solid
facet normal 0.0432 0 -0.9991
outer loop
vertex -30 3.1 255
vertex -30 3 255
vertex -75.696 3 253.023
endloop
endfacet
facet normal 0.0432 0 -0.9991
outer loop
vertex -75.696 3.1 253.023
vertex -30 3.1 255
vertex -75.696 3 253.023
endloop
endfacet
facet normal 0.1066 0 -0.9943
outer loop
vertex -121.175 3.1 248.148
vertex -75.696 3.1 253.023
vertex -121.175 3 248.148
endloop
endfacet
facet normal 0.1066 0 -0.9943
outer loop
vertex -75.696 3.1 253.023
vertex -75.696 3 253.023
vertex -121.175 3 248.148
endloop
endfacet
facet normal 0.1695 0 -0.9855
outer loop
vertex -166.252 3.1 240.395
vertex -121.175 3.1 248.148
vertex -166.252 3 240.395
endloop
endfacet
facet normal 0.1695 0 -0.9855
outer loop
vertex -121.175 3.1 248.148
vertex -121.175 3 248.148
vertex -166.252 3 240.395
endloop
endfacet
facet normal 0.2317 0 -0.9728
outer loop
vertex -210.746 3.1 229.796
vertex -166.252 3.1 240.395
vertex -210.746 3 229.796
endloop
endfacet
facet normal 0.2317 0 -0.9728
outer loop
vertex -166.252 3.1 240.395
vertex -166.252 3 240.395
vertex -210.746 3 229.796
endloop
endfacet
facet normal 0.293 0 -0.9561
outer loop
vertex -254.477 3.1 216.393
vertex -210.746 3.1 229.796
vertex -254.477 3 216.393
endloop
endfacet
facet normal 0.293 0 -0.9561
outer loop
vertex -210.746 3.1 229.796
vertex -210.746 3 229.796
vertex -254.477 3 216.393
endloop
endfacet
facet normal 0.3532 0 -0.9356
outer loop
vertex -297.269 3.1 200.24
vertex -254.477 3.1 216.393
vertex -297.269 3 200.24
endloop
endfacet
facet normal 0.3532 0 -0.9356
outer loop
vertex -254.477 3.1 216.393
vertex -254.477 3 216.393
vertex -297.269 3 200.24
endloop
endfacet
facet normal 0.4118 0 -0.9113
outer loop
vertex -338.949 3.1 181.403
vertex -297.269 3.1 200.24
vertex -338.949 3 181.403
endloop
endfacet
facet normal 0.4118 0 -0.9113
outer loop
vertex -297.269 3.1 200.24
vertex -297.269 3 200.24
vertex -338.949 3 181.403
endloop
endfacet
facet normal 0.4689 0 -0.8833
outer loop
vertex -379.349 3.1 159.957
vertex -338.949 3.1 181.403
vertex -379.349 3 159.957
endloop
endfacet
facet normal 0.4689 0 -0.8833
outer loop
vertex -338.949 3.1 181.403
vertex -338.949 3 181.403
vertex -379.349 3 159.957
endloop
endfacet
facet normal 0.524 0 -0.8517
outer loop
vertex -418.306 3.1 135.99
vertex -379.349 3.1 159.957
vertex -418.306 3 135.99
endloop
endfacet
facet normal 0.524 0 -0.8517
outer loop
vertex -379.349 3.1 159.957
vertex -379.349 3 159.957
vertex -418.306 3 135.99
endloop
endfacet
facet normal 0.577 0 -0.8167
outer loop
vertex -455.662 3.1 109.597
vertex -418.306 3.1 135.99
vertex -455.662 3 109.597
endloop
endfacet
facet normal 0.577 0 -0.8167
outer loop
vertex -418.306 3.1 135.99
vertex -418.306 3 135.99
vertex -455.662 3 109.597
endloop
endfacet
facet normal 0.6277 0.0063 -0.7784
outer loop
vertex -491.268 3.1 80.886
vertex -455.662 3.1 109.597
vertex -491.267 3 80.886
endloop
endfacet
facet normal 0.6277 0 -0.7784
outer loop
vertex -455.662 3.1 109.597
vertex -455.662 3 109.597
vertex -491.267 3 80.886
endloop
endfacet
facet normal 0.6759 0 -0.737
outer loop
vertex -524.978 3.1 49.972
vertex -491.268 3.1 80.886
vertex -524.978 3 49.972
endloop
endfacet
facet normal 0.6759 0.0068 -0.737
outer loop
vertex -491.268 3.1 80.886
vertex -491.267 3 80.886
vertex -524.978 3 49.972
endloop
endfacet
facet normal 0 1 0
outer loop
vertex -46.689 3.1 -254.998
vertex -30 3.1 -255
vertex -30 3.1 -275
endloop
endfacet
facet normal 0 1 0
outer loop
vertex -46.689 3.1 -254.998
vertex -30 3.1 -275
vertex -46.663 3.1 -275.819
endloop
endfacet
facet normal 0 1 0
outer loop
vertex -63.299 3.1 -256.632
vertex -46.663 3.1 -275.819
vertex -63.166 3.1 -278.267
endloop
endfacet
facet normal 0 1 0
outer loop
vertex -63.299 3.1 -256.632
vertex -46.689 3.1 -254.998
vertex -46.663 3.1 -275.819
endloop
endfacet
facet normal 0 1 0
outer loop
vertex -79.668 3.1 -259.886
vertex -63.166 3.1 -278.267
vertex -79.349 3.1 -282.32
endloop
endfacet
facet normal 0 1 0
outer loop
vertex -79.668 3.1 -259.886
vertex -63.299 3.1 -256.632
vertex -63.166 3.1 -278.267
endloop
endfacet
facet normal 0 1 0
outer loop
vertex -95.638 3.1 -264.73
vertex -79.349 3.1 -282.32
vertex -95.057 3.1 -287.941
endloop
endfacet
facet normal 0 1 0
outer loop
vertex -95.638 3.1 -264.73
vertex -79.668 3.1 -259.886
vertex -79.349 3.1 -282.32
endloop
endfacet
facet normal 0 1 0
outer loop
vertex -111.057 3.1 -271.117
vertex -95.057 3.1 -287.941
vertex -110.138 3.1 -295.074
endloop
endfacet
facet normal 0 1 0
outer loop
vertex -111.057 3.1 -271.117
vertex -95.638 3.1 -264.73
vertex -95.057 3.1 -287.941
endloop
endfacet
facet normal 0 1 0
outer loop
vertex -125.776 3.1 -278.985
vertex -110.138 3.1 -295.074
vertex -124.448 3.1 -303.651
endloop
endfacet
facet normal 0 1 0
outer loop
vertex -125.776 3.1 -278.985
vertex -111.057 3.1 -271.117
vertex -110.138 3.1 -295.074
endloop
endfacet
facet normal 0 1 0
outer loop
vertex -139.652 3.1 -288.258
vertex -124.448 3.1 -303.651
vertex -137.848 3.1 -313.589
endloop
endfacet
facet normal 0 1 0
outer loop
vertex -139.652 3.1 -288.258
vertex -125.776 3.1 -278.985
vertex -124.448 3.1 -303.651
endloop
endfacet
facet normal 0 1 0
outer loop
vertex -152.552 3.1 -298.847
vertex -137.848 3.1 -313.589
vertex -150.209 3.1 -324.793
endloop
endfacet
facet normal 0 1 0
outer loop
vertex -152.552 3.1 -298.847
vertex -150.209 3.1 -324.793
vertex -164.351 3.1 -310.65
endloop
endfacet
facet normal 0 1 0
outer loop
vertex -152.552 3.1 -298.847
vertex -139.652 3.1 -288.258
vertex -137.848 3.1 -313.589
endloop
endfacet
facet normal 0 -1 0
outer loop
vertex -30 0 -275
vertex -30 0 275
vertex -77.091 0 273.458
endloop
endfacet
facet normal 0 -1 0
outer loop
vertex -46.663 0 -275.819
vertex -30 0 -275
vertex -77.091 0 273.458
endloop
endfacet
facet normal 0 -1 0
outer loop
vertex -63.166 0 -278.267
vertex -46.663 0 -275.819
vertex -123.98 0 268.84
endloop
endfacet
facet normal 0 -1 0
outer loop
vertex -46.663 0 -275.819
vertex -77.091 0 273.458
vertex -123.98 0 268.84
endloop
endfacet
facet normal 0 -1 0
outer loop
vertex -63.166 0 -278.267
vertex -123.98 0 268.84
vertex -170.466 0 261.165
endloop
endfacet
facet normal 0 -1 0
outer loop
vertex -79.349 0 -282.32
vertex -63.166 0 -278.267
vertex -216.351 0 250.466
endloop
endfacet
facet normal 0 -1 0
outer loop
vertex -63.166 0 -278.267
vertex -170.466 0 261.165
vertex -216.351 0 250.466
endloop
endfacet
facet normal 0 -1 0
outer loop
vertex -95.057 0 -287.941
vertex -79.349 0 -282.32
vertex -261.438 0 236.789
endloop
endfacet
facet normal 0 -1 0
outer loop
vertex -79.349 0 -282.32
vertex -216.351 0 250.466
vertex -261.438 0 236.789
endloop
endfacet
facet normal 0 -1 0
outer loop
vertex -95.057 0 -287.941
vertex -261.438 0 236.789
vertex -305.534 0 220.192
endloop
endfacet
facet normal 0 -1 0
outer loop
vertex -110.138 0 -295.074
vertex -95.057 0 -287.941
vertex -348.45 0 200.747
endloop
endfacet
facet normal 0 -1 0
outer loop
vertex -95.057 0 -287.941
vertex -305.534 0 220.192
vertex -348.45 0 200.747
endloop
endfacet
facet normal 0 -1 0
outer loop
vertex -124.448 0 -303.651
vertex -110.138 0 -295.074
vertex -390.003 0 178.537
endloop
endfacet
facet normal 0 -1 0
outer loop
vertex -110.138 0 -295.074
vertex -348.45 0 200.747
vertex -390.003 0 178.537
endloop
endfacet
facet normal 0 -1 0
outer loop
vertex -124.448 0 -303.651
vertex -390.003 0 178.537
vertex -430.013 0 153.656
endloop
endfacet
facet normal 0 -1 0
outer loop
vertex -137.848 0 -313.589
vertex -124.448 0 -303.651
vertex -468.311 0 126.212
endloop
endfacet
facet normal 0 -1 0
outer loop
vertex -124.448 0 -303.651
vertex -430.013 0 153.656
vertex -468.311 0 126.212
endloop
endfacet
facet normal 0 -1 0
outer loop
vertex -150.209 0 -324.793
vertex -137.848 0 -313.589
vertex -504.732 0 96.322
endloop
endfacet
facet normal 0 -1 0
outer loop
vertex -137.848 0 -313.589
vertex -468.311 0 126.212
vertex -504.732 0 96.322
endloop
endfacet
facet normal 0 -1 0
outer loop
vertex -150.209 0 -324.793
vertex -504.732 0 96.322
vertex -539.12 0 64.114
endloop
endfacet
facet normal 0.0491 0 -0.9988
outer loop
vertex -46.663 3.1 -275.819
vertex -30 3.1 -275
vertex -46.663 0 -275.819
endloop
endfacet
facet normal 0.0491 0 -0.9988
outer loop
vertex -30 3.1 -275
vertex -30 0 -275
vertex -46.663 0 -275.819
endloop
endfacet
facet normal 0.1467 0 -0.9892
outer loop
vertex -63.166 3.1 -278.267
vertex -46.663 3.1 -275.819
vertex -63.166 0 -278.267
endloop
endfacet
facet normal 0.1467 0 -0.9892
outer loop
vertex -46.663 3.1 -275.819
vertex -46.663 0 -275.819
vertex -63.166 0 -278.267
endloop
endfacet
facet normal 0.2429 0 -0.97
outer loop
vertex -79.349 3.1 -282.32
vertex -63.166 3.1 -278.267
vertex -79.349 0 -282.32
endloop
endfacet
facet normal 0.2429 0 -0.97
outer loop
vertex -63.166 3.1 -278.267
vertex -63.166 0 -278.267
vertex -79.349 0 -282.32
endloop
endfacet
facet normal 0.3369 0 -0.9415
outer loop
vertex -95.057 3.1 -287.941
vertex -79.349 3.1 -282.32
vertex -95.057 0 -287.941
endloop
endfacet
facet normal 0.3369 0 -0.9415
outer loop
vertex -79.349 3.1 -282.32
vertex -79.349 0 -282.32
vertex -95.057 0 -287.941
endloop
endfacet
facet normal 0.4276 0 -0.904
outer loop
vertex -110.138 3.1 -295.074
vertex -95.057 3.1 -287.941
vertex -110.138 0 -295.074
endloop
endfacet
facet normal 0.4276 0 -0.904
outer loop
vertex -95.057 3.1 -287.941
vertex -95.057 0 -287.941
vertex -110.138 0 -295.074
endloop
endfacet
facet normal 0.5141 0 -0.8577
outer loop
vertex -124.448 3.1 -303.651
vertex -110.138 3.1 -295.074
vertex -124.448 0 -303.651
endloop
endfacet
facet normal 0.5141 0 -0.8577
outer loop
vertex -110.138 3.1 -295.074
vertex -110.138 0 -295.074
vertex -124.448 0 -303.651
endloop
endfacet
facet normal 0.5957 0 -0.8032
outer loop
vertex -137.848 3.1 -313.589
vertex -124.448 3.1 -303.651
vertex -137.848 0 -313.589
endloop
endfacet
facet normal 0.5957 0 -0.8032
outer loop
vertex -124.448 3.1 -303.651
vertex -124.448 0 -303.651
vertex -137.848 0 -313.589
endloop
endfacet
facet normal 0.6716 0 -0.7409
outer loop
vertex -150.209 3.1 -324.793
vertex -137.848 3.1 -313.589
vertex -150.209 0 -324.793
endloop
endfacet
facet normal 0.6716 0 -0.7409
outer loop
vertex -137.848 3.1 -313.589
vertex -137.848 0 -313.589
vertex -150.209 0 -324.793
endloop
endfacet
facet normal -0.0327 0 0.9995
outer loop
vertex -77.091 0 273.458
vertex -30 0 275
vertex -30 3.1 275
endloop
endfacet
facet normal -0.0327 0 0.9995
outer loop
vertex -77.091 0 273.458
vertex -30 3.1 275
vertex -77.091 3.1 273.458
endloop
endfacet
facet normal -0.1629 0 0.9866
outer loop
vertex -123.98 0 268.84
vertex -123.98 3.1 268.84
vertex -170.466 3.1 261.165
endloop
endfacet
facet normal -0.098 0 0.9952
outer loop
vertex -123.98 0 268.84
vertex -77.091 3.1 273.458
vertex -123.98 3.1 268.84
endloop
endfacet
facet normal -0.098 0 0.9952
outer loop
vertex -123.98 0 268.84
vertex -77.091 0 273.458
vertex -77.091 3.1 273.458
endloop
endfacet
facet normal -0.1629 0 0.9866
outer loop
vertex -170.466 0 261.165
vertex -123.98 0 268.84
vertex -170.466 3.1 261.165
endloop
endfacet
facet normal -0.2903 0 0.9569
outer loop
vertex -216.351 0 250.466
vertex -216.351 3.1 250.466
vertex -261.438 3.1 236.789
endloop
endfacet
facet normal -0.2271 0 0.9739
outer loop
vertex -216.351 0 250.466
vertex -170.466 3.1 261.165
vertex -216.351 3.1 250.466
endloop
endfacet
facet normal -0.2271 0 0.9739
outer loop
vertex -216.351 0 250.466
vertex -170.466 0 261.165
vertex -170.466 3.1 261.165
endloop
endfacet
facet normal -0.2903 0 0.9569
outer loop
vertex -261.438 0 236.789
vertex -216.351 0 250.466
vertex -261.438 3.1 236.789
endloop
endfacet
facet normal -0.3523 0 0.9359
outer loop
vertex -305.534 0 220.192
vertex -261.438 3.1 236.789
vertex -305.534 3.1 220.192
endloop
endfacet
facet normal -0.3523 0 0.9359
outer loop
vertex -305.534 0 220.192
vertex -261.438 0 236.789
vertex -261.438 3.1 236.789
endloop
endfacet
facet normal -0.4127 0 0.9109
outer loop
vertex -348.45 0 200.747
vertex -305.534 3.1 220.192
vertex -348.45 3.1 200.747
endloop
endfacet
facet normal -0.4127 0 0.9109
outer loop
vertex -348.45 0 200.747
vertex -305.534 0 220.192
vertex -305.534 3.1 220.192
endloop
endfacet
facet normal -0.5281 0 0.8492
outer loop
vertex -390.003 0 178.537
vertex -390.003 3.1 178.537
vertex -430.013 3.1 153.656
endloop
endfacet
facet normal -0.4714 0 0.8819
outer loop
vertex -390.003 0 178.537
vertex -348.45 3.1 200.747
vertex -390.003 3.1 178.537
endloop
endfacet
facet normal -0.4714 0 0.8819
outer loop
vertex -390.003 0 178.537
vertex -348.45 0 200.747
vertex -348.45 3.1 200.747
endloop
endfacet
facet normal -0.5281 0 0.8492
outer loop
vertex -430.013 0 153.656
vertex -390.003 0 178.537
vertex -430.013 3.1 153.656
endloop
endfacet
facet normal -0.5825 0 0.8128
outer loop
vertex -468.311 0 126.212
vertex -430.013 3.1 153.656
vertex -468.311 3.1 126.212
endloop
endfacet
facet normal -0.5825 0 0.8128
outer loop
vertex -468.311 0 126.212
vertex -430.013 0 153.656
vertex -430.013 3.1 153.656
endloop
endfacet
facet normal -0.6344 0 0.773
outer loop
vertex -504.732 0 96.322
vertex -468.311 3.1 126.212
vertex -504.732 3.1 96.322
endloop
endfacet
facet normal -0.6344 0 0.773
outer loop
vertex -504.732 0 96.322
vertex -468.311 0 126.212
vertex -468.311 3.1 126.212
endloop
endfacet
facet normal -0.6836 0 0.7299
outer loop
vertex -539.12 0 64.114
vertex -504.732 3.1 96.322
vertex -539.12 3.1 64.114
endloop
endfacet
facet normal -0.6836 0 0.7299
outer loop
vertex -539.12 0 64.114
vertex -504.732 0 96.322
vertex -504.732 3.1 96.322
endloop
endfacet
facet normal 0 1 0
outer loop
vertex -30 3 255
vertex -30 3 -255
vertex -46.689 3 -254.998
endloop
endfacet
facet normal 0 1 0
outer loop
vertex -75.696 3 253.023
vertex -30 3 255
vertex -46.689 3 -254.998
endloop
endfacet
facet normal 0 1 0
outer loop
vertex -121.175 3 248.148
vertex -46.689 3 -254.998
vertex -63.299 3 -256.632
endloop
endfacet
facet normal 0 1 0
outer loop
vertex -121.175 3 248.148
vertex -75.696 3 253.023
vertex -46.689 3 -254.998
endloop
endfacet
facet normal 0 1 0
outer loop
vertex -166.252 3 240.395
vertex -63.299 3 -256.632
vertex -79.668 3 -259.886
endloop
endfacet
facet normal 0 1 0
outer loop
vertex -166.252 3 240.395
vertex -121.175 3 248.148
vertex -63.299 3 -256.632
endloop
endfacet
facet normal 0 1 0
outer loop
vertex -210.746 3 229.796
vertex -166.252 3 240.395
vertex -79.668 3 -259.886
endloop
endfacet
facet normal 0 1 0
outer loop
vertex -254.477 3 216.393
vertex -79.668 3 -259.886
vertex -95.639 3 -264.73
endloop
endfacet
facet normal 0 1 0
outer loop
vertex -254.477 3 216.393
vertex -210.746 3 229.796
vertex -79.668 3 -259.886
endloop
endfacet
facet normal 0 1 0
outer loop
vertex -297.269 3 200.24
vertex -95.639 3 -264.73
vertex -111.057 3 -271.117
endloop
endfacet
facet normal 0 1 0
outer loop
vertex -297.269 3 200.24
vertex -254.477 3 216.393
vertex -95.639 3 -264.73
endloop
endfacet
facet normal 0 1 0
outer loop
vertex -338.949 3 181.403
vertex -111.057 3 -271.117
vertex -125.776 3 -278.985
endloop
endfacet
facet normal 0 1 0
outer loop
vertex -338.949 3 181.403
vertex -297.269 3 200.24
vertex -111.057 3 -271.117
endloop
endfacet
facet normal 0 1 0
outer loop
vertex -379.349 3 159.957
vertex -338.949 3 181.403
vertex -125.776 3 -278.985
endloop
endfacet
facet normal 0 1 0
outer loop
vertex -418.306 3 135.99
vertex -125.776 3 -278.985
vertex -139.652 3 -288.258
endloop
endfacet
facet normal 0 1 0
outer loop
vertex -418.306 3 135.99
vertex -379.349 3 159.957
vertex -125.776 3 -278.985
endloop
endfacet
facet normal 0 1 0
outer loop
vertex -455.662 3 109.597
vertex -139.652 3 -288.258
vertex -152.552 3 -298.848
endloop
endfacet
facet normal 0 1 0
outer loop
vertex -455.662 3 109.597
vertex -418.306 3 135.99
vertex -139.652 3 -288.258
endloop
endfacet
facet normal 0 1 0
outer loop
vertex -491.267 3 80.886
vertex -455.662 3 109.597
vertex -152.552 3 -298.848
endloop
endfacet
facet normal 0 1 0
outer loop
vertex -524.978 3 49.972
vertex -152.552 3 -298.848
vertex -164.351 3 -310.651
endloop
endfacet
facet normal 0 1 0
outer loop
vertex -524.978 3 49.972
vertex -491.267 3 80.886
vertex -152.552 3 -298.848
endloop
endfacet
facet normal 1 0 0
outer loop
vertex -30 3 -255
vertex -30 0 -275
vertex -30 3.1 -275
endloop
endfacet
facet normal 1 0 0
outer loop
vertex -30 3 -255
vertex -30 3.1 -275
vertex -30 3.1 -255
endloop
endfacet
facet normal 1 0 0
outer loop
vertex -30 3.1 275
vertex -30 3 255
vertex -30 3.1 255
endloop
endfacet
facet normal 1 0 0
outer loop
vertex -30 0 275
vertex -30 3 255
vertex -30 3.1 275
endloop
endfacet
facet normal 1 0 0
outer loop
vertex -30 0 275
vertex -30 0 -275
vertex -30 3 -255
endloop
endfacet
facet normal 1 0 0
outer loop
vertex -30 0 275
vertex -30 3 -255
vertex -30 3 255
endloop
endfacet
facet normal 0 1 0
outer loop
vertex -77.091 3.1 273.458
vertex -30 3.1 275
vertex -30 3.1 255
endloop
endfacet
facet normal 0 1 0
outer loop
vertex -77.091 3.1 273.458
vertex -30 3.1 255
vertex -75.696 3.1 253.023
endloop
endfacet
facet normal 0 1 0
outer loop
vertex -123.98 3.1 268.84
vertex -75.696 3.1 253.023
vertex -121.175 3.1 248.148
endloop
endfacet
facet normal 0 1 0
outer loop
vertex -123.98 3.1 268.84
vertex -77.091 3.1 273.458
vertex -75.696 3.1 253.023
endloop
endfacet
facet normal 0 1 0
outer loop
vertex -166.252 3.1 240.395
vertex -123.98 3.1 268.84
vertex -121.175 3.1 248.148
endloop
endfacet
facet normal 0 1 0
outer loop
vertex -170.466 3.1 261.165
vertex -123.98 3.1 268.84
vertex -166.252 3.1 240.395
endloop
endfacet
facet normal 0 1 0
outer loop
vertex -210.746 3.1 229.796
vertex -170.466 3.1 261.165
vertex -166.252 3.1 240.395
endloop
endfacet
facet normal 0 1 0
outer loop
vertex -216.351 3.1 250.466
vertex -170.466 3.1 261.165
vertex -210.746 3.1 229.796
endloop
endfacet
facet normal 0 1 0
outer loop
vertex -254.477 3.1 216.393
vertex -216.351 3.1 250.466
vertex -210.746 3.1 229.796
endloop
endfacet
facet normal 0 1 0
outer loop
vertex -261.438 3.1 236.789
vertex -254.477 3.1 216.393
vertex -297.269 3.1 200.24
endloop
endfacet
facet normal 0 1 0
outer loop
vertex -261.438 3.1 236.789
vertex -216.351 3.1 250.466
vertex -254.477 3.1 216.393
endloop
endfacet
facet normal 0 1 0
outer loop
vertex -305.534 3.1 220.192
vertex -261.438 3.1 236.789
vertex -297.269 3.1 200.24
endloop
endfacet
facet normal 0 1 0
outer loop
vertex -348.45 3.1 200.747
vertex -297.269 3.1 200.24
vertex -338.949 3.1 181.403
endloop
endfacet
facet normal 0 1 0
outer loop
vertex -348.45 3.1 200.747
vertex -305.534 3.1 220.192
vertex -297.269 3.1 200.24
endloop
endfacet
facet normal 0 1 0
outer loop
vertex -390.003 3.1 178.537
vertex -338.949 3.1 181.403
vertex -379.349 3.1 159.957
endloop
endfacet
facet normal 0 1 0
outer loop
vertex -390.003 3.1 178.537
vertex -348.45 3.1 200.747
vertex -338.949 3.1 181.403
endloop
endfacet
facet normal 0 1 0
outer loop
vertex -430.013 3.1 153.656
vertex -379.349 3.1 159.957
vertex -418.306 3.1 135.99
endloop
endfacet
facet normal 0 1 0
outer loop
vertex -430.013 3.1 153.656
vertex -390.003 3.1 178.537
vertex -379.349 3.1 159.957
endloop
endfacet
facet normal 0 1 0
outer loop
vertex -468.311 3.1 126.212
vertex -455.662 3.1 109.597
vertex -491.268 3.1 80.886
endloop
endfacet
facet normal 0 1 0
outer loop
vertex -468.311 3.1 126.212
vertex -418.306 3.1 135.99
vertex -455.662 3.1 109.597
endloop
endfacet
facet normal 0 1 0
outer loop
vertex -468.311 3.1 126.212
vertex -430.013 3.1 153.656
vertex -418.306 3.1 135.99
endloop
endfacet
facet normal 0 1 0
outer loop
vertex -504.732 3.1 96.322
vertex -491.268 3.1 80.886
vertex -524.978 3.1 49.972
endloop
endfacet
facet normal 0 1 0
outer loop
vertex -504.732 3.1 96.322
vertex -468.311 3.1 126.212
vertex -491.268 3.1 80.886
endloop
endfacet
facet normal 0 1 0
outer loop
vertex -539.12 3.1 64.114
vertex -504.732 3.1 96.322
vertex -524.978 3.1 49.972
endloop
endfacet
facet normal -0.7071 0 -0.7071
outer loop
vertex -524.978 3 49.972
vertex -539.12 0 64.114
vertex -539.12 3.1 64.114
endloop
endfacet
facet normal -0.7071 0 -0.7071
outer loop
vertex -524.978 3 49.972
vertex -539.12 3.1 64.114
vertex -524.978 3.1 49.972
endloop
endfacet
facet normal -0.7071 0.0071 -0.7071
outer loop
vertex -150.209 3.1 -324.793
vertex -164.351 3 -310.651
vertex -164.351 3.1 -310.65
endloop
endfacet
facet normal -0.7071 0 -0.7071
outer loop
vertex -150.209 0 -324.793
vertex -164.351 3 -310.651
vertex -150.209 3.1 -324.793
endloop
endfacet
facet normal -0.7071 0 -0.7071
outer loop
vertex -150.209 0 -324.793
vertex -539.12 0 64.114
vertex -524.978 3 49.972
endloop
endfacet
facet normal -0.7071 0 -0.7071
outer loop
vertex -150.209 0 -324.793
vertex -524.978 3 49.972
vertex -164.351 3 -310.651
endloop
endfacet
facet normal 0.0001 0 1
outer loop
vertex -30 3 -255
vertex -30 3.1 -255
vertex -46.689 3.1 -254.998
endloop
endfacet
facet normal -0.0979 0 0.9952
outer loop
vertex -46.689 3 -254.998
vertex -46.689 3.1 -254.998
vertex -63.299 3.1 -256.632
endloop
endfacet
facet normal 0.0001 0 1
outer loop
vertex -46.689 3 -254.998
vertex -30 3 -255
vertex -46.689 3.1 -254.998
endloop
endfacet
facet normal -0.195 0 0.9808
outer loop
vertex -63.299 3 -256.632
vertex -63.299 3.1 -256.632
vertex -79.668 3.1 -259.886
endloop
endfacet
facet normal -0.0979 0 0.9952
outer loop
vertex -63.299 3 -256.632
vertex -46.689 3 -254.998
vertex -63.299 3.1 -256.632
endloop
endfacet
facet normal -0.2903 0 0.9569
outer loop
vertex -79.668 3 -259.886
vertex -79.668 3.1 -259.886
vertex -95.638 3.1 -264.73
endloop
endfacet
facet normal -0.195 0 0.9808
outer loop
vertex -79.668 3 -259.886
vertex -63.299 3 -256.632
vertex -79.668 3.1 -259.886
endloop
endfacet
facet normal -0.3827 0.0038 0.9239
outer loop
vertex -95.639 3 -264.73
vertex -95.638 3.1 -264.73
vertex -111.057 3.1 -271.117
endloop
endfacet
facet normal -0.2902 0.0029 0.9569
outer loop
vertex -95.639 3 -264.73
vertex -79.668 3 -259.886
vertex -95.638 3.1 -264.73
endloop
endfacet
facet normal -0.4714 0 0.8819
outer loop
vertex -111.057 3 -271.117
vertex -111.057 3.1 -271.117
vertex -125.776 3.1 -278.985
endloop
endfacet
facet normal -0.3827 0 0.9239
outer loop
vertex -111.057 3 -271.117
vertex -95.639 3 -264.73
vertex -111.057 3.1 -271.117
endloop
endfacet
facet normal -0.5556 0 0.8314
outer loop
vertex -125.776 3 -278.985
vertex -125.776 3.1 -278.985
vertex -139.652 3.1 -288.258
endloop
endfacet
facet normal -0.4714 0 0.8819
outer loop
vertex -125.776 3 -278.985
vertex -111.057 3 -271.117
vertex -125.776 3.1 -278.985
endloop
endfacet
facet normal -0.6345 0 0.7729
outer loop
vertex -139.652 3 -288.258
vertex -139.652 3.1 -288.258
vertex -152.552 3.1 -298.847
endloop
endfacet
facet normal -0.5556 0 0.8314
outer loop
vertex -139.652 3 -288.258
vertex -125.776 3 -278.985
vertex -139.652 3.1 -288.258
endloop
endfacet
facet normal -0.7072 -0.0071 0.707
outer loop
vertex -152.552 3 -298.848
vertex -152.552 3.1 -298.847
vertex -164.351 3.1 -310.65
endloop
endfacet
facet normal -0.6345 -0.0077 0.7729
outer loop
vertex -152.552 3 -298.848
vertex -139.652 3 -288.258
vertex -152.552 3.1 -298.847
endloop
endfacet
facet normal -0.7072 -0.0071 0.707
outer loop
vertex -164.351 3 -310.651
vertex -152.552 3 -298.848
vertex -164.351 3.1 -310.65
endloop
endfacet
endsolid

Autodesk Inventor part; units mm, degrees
ref_plane "YZ Plane" through (0, 0, 0) normal (1, 0, 0) x (0, 1, 0)
ref_plane "XZ Plane" through (0, 0, 0) normal (0, 1, 0) x (-1, 0, 0)
ref_plane "XY Plane" through (0, 0, 0) normal (0, 0, 1) x (1, 0, 0)
sketch "Sketch1" plane through (0, 0, 0) normal (0, 1, 0) x (-1, 0, 0)
  line L0 (30, 275) -> (0, 275)
  line L1 (0, 275) -> (0, -275)
  line L2 (0, -275) -> (30, -275)
  line L3 (30, -275) -> (30, 275)
  line L4 (539.12, 64.1138) -> (150.2089, -324.7926)
  arc A0 (539.12, 64.1138) -> (30, 275) centre (30, -445) ccw
  arc A1 (150.2089, -324.7926) -> (30, -275) centre (30, -445) ccw
  line L5 (0, 255) -> (30, 255)
  line L6 (0, -255) -> (30, -255)
  arc A2 (524.9778, 49.9717) -> (30, 255) centre (21.7353, -464.9526) ccw
  arc A3 (164.3511, -310.6505) -> (30, -255) centre (38.3697, -424.7938) ccw
  point P0 (0, 0)
  point P1 (0, 0)
  dimension "d0" = 30
  dimension "d1" = 550
  dimension "d4" = 550
  dimension "d8" = 539.12
  dimension "d9" = 720
  dimension "d10" = 170
  dimension "d19" = 20
  dimension "d20" = 20
  dimension "d21" = 20
  dimension "d22" = 20
  dimension "d26" = 170
  dimension "d27" = 720
extrude "Extrusion1" add sketch "Sketch1" along normal blind 3 contours A0 L4 A2 L3 | A2 L4 A3 L3 | A3 L4 A1 L3
extrude "Extrusion2" add sketch "Sketch1" along normal blind 3.1 contours A0 L4 A2 L3 | A3 L4 A1 L3
equation "\"d1\" = track_width"
equation "\"d4\" = d1"
equation "\"d19\" = curb_width"
equation "\"d20\" = curb_width"
equation "\"d21\" = curb_width"
equation "\"d22\" = curb_width"
equation "\"d26\" = d10"
equation "\"d27\" = d9"
equation "\"d6\" = track_height"
equation "\"d24\" = track_height + curb_height"
equation "\"track_width\" = 550"
equation "\"curb_width\" = 20"
equation "\"track_height\" = 3"
equation "\"curb_height\" = 0.1"
properties part number "curve_left"
